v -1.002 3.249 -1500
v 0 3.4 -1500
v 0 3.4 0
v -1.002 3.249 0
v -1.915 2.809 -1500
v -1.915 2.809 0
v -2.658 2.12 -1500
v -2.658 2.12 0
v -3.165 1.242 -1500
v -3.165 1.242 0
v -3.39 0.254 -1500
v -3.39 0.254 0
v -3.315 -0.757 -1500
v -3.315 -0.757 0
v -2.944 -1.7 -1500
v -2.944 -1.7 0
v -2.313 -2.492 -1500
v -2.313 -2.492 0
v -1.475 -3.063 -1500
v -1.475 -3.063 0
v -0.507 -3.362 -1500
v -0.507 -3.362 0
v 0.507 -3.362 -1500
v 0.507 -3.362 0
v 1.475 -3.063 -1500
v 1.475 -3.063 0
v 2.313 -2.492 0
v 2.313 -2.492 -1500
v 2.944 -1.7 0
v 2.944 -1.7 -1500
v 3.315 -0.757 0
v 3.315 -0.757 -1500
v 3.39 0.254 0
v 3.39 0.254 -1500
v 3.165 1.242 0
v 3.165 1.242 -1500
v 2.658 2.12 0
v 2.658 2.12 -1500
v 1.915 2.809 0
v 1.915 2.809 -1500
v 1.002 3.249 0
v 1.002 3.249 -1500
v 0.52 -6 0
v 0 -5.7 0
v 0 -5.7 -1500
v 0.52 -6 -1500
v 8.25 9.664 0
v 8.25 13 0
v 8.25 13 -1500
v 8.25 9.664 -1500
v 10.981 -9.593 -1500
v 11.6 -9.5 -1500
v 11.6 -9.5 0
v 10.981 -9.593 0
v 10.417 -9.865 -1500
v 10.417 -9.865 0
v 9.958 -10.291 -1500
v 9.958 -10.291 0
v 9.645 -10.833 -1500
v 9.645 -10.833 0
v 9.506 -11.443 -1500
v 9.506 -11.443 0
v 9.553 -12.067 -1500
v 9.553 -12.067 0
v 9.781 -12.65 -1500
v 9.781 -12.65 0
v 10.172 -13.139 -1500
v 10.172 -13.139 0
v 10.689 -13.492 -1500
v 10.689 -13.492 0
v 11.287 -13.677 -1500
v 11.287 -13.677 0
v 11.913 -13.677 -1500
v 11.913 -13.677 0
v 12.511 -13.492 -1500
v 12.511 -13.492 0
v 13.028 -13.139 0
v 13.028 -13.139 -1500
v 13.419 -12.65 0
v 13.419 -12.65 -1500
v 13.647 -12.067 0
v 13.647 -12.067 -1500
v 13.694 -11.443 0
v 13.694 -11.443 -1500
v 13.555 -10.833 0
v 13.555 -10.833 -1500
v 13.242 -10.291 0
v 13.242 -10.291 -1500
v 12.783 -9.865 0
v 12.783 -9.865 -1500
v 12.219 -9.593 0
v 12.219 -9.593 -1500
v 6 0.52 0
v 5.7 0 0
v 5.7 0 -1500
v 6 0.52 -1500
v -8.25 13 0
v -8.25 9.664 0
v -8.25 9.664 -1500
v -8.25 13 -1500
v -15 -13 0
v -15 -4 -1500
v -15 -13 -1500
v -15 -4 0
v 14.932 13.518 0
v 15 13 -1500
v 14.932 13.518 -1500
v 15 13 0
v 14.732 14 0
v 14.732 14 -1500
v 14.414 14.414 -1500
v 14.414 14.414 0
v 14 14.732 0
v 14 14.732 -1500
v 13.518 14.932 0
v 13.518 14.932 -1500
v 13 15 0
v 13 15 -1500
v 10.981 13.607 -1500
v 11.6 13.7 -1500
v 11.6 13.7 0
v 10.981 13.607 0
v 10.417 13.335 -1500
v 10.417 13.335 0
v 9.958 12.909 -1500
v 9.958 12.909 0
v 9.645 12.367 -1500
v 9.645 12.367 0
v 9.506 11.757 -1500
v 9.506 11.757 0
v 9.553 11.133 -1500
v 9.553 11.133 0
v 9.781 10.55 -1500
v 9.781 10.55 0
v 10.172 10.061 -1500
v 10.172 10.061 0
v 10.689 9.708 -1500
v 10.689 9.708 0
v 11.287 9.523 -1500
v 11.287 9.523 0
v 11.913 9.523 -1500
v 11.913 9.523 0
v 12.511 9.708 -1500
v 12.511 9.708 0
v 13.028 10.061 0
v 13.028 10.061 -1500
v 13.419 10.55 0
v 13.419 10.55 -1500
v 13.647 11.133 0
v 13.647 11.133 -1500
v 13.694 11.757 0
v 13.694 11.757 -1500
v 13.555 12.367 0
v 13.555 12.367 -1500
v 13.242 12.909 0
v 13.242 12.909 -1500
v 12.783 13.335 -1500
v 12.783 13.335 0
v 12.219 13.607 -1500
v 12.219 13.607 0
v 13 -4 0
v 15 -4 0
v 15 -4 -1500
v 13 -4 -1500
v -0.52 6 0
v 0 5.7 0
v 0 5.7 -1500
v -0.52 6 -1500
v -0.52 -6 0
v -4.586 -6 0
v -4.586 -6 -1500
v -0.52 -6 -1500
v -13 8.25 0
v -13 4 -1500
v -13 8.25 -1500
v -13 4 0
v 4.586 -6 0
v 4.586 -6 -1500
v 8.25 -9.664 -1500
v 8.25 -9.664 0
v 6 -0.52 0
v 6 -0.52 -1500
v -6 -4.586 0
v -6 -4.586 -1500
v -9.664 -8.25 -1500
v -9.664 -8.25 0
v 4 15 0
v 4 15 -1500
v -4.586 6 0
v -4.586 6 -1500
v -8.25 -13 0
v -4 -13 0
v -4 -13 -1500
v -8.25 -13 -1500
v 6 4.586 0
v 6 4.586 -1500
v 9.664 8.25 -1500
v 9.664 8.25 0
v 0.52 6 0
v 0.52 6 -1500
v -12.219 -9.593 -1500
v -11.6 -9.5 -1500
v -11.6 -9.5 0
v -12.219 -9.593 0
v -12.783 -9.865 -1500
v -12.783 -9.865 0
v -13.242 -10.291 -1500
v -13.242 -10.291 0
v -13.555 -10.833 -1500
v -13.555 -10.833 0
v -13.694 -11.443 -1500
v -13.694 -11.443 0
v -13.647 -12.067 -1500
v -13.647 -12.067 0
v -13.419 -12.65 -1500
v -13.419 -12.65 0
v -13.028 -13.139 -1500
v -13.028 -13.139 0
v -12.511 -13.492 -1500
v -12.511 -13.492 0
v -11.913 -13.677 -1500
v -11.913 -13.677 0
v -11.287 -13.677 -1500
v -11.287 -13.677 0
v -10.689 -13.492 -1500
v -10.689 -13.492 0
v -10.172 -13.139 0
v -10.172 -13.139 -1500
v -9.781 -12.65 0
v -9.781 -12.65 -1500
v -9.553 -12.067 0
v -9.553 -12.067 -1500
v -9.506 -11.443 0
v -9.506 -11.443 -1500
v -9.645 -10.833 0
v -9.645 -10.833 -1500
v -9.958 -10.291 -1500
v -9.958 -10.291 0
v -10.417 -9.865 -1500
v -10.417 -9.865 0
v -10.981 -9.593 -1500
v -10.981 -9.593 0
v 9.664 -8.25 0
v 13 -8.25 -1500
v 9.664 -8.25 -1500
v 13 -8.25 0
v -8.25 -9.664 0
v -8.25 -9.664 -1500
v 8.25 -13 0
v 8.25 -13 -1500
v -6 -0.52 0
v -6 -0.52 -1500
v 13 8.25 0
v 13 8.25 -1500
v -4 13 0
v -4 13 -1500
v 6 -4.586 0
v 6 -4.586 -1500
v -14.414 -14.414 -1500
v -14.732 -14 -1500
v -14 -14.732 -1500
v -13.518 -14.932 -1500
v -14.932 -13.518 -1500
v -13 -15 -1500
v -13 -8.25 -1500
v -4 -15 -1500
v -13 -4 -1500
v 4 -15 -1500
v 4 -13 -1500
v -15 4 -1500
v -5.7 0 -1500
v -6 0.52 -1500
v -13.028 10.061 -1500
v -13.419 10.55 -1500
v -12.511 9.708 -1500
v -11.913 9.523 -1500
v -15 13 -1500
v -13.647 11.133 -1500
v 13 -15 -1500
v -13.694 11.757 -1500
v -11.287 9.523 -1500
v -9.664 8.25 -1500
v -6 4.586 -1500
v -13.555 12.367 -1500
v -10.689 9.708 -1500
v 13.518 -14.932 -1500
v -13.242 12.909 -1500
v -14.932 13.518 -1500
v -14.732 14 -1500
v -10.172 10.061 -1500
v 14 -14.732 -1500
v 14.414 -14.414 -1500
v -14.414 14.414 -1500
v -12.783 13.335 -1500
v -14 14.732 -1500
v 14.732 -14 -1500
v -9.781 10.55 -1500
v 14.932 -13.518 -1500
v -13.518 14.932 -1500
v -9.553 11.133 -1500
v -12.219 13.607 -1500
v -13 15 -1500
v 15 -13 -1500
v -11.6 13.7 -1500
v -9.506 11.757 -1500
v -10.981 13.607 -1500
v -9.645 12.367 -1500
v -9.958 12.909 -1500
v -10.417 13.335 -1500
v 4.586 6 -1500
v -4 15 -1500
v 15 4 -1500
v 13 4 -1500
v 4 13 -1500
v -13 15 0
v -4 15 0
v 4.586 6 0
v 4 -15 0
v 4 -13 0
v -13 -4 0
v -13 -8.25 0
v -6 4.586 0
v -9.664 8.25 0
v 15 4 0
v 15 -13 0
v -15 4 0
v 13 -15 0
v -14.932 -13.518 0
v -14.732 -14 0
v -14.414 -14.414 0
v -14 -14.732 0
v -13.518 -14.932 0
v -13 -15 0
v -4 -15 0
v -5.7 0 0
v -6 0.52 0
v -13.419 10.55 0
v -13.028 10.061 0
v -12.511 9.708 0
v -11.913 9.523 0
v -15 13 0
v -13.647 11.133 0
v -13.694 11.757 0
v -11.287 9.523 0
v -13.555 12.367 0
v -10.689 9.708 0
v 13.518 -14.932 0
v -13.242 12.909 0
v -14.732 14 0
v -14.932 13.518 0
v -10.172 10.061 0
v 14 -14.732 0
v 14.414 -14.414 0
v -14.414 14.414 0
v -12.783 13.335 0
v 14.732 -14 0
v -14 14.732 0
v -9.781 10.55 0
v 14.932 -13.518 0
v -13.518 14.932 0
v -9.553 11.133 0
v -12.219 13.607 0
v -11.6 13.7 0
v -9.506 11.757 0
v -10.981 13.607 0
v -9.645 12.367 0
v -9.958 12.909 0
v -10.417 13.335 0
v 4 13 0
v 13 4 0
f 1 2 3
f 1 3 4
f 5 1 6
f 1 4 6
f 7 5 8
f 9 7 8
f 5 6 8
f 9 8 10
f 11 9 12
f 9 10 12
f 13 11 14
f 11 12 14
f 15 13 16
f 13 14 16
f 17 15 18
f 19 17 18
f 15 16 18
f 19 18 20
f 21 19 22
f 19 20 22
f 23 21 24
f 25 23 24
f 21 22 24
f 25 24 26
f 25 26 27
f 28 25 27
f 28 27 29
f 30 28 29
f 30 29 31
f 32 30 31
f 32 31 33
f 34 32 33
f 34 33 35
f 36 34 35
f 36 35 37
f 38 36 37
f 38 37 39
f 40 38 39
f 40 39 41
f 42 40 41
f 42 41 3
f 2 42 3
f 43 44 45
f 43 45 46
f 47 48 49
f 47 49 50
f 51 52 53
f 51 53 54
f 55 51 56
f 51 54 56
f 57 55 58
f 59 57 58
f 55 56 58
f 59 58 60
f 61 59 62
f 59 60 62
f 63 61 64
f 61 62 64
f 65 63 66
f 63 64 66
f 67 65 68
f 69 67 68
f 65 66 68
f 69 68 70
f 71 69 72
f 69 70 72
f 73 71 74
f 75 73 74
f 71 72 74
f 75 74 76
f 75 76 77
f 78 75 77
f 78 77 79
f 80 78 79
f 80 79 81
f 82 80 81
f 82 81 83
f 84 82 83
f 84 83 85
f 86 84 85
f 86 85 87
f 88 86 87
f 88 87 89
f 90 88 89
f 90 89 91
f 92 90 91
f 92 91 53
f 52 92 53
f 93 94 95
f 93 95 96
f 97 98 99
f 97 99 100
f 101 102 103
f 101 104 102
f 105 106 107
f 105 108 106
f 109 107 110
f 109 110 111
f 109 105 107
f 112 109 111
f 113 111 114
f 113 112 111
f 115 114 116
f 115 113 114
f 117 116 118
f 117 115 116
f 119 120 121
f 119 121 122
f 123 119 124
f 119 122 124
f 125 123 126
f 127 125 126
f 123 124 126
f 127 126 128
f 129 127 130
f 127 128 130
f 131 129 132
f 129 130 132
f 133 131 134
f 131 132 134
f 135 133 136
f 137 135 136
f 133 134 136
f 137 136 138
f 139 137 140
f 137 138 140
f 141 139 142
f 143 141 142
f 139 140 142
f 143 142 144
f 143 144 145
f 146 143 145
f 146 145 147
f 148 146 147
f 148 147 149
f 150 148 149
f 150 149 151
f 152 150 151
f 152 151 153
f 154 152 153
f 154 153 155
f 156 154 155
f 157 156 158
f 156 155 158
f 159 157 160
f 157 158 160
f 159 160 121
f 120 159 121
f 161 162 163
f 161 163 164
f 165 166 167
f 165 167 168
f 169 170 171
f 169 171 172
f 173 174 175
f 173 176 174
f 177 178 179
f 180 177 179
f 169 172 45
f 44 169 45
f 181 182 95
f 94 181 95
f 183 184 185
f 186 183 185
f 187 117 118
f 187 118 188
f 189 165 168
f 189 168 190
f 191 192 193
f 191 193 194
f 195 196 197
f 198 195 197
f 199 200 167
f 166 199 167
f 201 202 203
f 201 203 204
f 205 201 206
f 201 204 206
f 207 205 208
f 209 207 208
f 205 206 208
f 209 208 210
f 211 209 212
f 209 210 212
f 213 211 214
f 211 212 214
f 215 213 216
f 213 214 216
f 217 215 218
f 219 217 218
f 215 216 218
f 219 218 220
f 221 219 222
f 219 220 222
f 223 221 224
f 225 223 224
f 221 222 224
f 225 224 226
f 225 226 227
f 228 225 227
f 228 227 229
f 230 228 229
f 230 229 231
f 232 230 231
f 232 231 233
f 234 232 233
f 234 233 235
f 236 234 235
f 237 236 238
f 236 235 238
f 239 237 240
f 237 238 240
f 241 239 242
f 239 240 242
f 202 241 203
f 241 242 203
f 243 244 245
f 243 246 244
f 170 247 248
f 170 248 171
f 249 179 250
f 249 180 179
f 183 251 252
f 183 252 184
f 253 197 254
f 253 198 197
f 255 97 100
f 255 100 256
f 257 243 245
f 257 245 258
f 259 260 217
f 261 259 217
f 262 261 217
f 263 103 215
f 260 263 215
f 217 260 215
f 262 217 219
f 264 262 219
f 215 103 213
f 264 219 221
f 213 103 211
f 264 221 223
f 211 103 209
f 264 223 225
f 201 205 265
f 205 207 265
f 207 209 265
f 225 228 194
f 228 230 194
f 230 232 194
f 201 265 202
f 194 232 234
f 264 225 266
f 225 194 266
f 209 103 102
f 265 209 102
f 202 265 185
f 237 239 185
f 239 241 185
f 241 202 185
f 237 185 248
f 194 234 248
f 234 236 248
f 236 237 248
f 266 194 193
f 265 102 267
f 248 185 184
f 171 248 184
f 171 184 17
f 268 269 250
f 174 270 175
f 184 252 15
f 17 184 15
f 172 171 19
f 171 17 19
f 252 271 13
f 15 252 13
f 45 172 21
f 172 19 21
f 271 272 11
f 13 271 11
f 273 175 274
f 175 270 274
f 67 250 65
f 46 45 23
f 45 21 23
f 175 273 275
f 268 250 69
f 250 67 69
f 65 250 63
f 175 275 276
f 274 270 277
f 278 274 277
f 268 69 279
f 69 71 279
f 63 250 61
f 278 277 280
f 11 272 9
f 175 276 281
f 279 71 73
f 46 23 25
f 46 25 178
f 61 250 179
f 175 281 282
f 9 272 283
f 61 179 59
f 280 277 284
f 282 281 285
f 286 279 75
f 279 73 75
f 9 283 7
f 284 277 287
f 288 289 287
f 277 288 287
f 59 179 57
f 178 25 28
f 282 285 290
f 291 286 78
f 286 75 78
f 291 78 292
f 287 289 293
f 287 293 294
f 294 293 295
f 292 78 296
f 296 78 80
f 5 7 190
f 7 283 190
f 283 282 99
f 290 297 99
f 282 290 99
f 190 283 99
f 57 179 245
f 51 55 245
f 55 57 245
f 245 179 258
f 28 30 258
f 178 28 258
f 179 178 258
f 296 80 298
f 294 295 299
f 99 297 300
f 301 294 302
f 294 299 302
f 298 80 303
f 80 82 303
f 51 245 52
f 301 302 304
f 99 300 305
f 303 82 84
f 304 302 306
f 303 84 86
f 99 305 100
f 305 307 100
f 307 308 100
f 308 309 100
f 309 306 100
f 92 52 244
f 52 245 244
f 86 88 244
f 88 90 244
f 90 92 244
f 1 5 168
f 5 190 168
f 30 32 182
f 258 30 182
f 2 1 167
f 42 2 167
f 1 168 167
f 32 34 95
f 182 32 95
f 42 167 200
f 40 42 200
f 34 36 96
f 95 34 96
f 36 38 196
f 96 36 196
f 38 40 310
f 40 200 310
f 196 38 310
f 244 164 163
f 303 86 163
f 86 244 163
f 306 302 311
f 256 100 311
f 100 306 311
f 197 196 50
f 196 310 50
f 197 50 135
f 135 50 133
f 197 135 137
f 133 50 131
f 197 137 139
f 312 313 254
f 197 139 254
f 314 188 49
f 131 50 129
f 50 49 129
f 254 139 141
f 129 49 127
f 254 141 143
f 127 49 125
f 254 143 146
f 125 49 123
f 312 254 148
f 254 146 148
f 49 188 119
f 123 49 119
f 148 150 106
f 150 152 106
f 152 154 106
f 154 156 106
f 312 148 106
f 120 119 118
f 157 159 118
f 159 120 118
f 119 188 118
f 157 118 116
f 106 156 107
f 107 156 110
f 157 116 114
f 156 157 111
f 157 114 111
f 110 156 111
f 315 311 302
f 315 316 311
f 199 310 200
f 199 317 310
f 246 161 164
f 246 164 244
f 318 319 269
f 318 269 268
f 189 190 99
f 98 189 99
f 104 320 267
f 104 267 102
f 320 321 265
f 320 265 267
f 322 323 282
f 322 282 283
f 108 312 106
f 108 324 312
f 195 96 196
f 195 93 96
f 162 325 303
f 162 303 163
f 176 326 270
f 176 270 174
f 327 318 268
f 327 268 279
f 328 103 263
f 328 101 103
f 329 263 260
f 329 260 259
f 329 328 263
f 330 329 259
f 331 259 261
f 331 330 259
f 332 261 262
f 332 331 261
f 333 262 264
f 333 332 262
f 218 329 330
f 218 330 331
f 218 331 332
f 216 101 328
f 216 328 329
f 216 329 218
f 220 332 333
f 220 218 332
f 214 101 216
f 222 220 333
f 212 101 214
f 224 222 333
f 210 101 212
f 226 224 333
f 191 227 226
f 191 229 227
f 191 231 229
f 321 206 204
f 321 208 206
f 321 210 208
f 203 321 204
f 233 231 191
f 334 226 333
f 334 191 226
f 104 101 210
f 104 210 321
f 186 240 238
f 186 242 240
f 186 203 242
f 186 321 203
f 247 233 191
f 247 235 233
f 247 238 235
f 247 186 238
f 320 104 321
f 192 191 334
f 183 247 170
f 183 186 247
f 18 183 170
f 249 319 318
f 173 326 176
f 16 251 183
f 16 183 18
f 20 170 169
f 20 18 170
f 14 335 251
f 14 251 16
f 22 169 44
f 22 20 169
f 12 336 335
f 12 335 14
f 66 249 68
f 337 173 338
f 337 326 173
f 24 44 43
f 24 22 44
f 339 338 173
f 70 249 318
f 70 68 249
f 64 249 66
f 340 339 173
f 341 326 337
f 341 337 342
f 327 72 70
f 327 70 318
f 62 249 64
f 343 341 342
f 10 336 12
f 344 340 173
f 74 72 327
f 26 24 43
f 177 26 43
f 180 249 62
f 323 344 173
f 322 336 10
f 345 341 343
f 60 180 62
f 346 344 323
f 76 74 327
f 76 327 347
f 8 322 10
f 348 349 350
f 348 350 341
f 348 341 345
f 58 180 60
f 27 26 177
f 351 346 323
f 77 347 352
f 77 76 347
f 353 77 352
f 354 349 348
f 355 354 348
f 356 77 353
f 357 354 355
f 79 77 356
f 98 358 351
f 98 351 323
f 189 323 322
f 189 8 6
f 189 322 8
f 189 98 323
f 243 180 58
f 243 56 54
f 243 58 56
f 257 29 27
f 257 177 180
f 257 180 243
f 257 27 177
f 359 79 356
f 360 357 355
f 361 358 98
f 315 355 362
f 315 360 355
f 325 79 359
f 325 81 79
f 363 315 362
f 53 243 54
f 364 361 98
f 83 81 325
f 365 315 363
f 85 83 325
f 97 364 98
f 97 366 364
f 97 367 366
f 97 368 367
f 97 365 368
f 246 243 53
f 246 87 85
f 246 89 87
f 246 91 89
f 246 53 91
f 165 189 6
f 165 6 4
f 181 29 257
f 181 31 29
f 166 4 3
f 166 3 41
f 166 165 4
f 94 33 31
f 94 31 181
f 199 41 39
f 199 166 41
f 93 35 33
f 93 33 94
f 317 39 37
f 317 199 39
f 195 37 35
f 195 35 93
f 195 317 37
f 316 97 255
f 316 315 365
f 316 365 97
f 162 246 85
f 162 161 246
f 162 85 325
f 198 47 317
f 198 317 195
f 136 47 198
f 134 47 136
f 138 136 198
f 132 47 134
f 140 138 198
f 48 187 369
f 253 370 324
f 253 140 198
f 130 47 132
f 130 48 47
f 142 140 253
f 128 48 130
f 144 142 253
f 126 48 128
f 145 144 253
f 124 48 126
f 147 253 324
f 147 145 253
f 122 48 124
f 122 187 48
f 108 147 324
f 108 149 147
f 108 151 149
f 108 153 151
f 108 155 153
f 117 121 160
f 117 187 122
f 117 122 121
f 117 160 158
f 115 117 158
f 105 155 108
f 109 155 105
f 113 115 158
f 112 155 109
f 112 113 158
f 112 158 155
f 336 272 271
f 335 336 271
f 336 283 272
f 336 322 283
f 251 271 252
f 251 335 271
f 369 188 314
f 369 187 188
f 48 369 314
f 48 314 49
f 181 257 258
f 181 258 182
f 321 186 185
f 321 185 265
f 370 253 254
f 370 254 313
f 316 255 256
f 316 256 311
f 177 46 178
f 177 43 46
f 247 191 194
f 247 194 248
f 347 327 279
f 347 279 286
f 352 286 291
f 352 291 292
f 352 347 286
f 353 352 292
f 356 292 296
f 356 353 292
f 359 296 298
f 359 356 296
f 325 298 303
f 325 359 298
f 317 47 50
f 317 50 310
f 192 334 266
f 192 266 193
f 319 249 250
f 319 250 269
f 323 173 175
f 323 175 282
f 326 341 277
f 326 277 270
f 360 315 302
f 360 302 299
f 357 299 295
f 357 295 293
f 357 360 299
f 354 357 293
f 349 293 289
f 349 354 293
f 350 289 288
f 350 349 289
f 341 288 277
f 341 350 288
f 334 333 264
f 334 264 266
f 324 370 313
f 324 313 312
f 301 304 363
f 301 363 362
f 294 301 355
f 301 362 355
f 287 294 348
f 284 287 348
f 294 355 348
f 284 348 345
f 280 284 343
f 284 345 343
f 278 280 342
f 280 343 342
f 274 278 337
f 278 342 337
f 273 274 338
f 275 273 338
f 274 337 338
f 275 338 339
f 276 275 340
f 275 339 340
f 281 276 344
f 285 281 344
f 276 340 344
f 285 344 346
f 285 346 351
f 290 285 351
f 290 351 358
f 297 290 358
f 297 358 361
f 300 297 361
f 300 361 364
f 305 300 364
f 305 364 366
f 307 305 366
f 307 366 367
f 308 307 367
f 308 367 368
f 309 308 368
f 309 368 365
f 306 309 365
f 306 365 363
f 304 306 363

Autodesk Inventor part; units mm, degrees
sketch "Sketch_1" plane through (0, 0, 0) normal (0, 0, 1) x (1, 0, 0)
  line L0 (-15, -4) -> (-15, -13)
  arc A0 (-15, -13) -> (-13, -15) centre (-13, -13) ccw
  line L1 (-13, -15) -> (-4, -15)
  line L2 (-4, -15) -> (-4, -13)
  line L3 (-4, -13) -> (-8.25, -13)
  line L4 (-8.25, -13) -> (-8.25, -9.6642)
  line L5 (-8.25, -9.6642) -> (-4.5858, -6)
  line L6 (-4.5858, -6) -> (-0.5196, -6)
  line L7 (-0.5196, -6) -> (0, -5.7)
  line L8 (0, -5.7) -> (0.5196, -6)
  line L9 (0.5196, -6) -> (4.5858, -6)
  line L10 (4.5858, -6) -> (8.25, -9.6642)
  line L11 (8.25, -9.6642) -> (8.25, -13)
  line L12 (8.25, -13) -> (4, -13)
  line L13 (4, -13) -> (4, -15)
  line L14 (4, -15) -> (13, -15)
  arc A1 (13, -15) -> (15, -13) centre (13, -13) ccw
  line L15 (15, -13) -> (15, -4)
  line L16 (15, -4) -> (13, -4)
  line L17 (13, -4) -> (13, -8.25)
  line L18 (13, -8.25) -> (9.6642, -8.25)
  line L19 (9.6642, -8.25) -> (6, -4.5858)
  line L20 (6, -4.5858) -> (6, -0.5196)
  line L21 (6, -0.5196) -> (5.7, 0)
  line L22 (5.7, 0) -> (6, 0.5196)
  line L23 (6, 0.5196) -> (6, 4.5858)
  line L24 (6, 4.5858) -> (9.6642, 8.25)
  line L25 (9.6642, 8.25) -> (13, 8.25)
  line L26 (13, 8.25) -> (13, 4)
  line L27 (13, 4) -> (15, 4)
  line L28 (15, 4) -> (15, 13)
  arc A2 (15, 13) -> (13, 15) centre (13, 13) ccw
  line L29 (13, 15) -> (4, 15)
  line L30 (4, 15) -> (4, 13)
  line L31 (4, 13) -> (8.25, 13)
  line L32 (8.25, 13) -> (8.25, 9.6642)
  line L33 (8.25, 9.6642) -> (4.5858, 6)
  line L34 (4.5858, 6) -> (0.5196, 6)
  line L35 (0.5196, 6) -> (0, 5.7)
  line L36 (0, 5.7) -> (-0.5196, 6)
  line L37 (-0.5196, 6) -> (-4.5858, 6)
  line L38 (-4.5858, 6) -> (-8.25, 9.6642)
  line L39 (-8.25, 9.6642) -> (-8.25, 13)
  line L40 (-8.25, 13) -> (-4, 13)
  line L41 (-4, 13) -> (-4, 15)
  line L42 (-4, 15) -> (-13, 15)
  arc A3 (-13, 15) -> (-15, 13) centre (-13, 13) ccw
  line L43 (-15, 13) -> (-15, 4)
  line L44 (-15, 4) -> (-13, 4)
  line L45 (-13, 4) -> (-13, 8.25)
  line L46 (-13, 8.25) -> (-9.6642, 8.25)
  line L47 (-9.6642, 8.25) -> (-6, 4.5858)
  line L48 (-6, 4.5858) -> (-6, 0.5196)
  line L49 (-6, 0.5196) -> (-5.7, 0)
  line L50 (-5.7, 0) -> (-6, -0.5196)
  line L51 (-6, -0.5196) -> (-6, -4.5858)
  line L52 (-6, -4.5858) -> (-9.6642, -8.25)
  line L53 (-9.6642, -8.25) -> (-13, -8.25)
  line L54 (-13, -8.25) -> (-13, -4)
  line L55 (-13, -4) -> (-15, -4)
extrude "Extrusion1" add sketch "Sketch_1" against normal blind 1500
sketch "Sketch2" plane through (0, 0, -1500) normal (0, 0, -1) x (-1, 0, 0)
  point P0 (0, 0)
hole "Hole1" at (0, 0, -1500) direction (0, 0, 1) diameter 6.8 depth 1500
sketch "Sketch3" plane through (0, 0, -1500) normal (0, 0, -1) x (-1, 0, 0)
  point P0 (-11.6, 11.6)
hole "Hole2" at (11.6, 11.6, -1500) direction (0, 0, 1) diameter 4.2 depth 1500
pattern_linear "Rectangular Pattern1" count 2 spacing 23.2 along (-1, 0, 0) count 2 spacing 23.2 along (0, -1, 0) of "Hole2"
ref_plane "C1_XY" through (0, 0, 0) normal (0, 0, 1) x (1, 0, 0)
ref_plane "C1_YZ" through (0, 0, 0) normal (1, 0, 0) x (0, 1, 0)
ref_plane "C1_ZX" through (0, 0, 0) normal (0, 1, 0) x (0, 0, 1)
ref_plane "to_frame_cap1_XY" through (0, 0, 0) normal (0, 0, 1) x (1, 0, 0)
ref_plane "to_frame_cap1_YZ" through (0, 0, 0) normal (1, 0, 0) x (0, 1, 0)
ref_plane "to_frame_cap1_ZX" through (0, 0, 0) normal (0, 1, 0) x (0, 0, 1)
ref_plane "to_frame_cap2_XY" through (0, 0, -1500) normal (0, 0, -1) x (1, 0, 0)
ref_plane "to_frame_cap2_YZ" through (0, 0, -1500) normal (1, 0, 0) x (0, -1, 0)
ref_plane "to_frame_cap2_ZX" through (0, 0, -1500) normal (0, -1, 0) x (0, 0, -1)
properties part number "HFS6-3030-1500"
